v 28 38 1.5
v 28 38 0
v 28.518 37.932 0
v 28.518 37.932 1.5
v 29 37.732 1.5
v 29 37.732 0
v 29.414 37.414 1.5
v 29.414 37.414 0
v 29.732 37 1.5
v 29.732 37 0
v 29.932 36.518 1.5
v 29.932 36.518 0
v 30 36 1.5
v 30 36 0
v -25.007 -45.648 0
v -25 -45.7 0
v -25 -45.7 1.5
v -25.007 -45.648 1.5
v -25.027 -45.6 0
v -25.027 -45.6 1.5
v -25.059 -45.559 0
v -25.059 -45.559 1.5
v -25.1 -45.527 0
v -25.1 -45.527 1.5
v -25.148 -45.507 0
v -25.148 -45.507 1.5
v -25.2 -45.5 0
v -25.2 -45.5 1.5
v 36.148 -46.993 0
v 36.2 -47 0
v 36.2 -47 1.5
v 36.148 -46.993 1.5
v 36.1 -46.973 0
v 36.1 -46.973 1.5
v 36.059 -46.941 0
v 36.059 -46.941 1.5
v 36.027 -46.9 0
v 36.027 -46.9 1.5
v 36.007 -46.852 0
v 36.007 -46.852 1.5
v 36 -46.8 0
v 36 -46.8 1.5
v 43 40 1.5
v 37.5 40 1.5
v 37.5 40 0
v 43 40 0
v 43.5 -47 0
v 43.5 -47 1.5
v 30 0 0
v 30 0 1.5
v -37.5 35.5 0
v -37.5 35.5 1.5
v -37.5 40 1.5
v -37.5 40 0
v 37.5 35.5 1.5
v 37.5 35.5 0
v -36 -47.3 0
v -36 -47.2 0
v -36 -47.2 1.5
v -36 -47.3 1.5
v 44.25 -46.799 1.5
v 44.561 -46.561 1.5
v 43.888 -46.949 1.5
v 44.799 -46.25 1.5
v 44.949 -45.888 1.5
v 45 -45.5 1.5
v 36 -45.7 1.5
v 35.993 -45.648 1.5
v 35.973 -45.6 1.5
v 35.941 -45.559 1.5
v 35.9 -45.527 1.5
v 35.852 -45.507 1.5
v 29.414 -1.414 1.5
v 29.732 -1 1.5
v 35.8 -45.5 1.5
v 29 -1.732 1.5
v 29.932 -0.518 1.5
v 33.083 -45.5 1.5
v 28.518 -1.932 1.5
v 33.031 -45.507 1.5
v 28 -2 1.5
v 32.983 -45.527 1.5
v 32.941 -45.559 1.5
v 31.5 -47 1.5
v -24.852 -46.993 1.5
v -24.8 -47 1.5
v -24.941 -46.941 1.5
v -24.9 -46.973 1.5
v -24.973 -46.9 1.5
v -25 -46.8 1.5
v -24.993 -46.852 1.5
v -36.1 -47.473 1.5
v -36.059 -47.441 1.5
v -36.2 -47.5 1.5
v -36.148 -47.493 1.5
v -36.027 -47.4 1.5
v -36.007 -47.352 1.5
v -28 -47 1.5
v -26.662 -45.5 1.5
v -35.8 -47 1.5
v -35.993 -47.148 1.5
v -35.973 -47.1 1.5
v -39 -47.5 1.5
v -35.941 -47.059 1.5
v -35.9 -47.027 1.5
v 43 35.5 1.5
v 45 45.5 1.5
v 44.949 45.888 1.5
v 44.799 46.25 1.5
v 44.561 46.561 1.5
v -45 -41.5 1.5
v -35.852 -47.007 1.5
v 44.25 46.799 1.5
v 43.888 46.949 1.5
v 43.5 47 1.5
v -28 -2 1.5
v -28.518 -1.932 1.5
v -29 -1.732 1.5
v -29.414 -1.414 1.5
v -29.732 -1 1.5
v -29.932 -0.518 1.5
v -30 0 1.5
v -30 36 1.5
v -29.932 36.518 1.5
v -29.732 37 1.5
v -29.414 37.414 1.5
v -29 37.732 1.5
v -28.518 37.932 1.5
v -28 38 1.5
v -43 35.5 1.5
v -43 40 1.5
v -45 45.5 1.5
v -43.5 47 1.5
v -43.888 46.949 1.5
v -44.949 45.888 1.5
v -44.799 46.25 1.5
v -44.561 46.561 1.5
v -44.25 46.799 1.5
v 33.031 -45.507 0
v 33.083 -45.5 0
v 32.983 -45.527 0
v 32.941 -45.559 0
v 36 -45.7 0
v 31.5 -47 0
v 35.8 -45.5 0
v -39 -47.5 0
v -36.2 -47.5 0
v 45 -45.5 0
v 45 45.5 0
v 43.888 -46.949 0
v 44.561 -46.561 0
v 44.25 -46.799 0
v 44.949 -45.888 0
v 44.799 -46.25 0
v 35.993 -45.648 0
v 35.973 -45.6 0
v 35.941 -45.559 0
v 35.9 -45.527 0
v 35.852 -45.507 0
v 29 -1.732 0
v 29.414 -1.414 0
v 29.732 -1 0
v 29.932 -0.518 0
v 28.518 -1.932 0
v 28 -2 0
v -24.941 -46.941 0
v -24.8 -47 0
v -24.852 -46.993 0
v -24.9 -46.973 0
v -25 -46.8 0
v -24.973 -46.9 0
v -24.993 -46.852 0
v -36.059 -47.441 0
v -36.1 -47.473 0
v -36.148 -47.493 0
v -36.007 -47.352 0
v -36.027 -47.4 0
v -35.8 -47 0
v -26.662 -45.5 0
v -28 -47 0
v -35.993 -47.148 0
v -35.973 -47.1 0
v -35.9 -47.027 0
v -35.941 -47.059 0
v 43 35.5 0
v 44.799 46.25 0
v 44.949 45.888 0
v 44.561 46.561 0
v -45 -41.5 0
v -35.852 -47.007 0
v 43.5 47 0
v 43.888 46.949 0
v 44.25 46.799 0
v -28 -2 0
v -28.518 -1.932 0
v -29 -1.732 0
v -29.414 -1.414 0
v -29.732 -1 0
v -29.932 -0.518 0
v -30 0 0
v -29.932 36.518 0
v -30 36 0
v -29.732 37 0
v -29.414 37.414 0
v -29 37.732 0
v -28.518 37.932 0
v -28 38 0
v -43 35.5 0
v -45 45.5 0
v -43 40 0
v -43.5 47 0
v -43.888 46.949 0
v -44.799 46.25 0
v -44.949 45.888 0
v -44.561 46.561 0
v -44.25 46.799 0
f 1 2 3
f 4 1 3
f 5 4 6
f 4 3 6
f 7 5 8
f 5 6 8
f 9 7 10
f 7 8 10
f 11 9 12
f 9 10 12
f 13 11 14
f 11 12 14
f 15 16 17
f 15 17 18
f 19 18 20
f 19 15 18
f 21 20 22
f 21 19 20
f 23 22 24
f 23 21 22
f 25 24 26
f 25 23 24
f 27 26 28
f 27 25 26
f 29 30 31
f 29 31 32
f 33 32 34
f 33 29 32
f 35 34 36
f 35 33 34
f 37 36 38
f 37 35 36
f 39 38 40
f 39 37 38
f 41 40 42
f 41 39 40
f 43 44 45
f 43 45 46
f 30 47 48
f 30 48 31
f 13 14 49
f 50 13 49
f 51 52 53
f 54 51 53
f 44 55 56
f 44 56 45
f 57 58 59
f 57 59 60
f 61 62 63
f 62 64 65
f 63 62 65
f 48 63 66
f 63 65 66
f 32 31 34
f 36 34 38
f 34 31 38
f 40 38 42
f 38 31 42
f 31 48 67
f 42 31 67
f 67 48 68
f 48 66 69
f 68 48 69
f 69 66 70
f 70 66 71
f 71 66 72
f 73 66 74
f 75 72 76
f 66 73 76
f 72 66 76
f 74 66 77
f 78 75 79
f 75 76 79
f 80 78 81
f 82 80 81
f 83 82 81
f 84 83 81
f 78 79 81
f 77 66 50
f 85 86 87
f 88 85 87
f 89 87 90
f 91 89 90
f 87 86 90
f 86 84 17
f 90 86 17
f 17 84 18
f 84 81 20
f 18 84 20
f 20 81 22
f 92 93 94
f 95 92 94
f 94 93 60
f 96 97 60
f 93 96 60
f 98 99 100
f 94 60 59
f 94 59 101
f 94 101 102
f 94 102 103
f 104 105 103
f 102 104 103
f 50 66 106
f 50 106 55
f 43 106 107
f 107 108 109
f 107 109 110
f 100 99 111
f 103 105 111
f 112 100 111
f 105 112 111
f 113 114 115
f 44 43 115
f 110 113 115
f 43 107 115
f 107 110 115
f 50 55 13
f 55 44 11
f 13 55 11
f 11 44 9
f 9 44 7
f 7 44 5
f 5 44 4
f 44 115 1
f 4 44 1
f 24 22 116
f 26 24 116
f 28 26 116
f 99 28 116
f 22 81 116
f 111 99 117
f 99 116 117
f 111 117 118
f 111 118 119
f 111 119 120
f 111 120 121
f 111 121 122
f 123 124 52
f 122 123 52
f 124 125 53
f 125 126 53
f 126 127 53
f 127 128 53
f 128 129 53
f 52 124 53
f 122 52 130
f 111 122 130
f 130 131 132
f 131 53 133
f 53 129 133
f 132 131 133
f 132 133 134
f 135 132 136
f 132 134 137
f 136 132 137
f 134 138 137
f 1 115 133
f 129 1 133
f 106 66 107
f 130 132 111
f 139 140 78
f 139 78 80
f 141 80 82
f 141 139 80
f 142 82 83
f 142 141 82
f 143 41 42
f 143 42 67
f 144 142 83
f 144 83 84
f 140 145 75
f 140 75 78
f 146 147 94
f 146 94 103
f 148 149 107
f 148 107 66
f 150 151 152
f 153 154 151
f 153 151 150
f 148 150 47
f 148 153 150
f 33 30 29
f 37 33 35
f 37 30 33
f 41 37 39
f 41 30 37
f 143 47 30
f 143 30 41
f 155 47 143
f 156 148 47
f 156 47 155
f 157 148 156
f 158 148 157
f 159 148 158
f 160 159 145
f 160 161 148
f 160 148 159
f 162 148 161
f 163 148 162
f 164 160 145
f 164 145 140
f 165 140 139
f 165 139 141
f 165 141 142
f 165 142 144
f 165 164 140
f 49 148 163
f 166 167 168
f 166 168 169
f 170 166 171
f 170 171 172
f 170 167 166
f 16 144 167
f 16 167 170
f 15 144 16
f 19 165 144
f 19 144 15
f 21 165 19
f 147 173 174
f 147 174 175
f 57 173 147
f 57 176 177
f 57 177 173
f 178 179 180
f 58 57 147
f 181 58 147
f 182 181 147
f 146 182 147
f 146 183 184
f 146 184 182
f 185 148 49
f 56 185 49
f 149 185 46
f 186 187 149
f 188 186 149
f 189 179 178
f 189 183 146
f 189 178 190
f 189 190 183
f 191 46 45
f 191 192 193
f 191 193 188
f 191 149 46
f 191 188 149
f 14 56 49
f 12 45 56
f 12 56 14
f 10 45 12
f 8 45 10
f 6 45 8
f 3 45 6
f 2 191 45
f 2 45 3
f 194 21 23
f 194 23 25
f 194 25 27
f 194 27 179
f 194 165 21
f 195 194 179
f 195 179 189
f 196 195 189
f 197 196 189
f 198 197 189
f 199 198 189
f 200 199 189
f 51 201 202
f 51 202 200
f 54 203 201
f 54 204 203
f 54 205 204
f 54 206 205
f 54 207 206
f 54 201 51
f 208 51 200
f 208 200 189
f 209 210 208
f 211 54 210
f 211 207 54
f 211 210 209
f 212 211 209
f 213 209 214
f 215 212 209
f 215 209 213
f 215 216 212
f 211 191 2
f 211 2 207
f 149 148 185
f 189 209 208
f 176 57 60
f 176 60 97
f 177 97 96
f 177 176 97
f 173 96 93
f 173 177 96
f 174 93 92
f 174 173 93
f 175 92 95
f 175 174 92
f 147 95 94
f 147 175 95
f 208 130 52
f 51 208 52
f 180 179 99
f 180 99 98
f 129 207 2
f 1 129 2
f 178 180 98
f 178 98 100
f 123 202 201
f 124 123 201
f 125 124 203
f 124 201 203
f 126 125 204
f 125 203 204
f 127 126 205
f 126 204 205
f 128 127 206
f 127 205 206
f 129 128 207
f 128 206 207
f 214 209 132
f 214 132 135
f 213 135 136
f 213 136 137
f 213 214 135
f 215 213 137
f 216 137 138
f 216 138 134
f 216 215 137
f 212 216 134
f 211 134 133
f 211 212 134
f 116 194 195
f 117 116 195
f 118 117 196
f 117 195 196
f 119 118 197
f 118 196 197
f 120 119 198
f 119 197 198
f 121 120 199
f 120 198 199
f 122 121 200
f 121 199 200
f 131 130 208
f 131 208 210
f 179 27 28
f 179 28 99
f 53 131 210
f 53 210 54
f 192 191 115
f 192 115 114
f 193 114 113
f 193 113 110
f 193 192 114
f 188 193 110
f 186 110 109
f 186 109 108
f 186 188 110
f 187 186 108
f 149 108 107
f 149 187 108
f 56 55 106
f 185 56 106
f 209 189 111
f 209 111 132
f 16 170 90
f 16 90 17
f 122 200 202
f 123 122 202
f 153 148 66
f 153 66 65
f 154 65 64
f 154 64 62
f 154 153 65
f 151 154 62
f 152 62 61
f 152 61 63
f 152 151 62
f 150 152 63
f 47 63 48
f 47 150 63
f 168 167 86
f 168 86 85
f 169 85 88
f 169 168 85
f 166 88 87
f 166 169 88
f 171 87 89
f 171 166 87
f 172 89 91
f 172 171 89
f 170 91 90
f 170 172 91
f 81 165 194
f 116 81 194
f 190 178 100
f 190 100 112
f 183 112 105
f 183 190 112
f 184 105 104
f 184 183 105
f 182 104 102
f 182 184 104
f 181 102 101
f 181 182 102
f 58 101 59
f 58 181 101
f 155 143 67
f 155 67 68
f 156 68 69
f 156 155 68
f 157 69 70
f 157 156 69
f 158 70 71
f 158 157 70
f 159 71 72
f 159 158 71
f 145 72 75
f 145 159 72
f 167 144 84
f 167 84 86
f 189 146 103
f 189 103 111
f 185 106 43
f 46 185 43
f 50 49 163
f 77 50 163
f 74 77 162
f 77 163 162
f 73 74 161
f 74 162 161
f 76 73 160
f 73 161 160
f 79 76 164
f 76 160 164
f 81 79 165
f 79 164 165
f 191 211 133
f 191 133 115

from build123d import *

# Parameters (mm, degrees)
BASE_EXTRUDE_DEPTH = 1.5
SKETCH12_W         = 5.5
SKETCH12_H         = 4.5
CUT_EXTRUDE5_DEPTH = 66.448452999
CUT_EXTRUDE7_DEPTH = 66.448452999


with BuildPart() as part:
    # Sketch1 → Base-Extrude (new body)
    with BuildSketch(Plane.XY):
        with BuildLine():
            Line((-43.5, 47), (0, 47))
            Line((0, 47), (43.5, 47))
            ThreePointArc((43.5, 47), (44.560660172, 46.560660172), (45, 45.5))
            Line((45, 45.5), (45, -45.5))
            ThreePointArc((45, -45.5), (44.560660172, -46.560660172), (43.5, -47))
            Line((43.5, -47), (36.2, -47))
            ThreePointArc((36.2, -47), (36.058578644, -46.941421356), (36, -46.8))
            Line((36, -46.8), (36, -45.7))
            ThreePointArc((36, -45.7), (35.941421356, -45.558578644), (35.8, -45.5))
            Line((35.8, -45.5), (33.082842712, -45.5))
            ThreePointArc((33.082842712, -45.5), (33.006306026, -45.515224093), (32.941421356, -45.558578644))
            Line((32.941421356, -45.558578644), (31.5, -47))
            Line((31.5, -47), (-24.8, -47))
            ThreePointArc((-24.8, -47), (-24.941421356, -46.941421356), (-25, -46.8))
            Line((-25, -46.8), (-25, -45.7))
            ThreePointArc((-25, -45.7), (-25.058578644, -45.558578644), (-25.2, -45.5))
            Line((-25.2, -45.5), (-26.661796764, -45.5))
            Line((-26.661796764, -45.5), (-28, -47))
            Line((-28, -47), (-35.8, -47))
            ThreePointArc((-35.8, -47), (-35.941421356, -47.058578644), (-36, -47.2))
            Line((-36, -47.2), (-36, -47.3))
            ThreePointArc((-36, -47.3), (-36.058578644, -47.441421356), (-36.2, -47.5))
            Line((-36.2, -47.5), (-39, -47.5))
            Line((-39, -47.5), (-45, -41.5))
            Line((-45, -41.5), (-45, 45.5))
            ThreePointArc((-45, 45.5), (-44.560660172, 46.560660172), (-43.5, 47))
        make_face()
    extrude(amount=BASE_EXTRUDE_DEPTH)

    # Sketch12 → Cut-Extrude5 (cut, through all)
    with BuildSketch(Plane.XY.offset(1.5)):
        with Locations((40.249857546, 37.75)):
            Rectangle(SKETCH12_W, SKETCH12_H)
        with Locations((-40.249857546, 37.75)):
            Rectangle(SKETCH12_W, SKETCH12_H)
    extrude(amount=-CUT_EXTRUDE5_DEPTH, mode=Mode.SUBTRACT)

    # Sketch13 → Cut-Extrude7 (cut, through all)
    with BuildSketch(Plane.XY):
        with BuildLine():
            Line((-28, 38), (28, 38))
            ThreePointArc((28, 38), (29.414213562, 37.414213562), (30, 36))
            Line((30, 36), (30, 0))
            ThreePointArc((30, 0), (29.414213562, -1.414213562), (28, -2))
            Line((28, -2), (-28, -2))
            ThreePointArc((-28, -2), (-29.414213562, -1.414213562), (-30, 0))
            Line((-30, 0), (-30, 36))
            ThreePointArc((-30, 36), (-29.414213562, 37.414213562), (-28, 38))
        make_face()
    extrude(amount=CUT_EXTRUDE7_DEPTH, mode=Mode.SUBTRACT)


solid = part.part
